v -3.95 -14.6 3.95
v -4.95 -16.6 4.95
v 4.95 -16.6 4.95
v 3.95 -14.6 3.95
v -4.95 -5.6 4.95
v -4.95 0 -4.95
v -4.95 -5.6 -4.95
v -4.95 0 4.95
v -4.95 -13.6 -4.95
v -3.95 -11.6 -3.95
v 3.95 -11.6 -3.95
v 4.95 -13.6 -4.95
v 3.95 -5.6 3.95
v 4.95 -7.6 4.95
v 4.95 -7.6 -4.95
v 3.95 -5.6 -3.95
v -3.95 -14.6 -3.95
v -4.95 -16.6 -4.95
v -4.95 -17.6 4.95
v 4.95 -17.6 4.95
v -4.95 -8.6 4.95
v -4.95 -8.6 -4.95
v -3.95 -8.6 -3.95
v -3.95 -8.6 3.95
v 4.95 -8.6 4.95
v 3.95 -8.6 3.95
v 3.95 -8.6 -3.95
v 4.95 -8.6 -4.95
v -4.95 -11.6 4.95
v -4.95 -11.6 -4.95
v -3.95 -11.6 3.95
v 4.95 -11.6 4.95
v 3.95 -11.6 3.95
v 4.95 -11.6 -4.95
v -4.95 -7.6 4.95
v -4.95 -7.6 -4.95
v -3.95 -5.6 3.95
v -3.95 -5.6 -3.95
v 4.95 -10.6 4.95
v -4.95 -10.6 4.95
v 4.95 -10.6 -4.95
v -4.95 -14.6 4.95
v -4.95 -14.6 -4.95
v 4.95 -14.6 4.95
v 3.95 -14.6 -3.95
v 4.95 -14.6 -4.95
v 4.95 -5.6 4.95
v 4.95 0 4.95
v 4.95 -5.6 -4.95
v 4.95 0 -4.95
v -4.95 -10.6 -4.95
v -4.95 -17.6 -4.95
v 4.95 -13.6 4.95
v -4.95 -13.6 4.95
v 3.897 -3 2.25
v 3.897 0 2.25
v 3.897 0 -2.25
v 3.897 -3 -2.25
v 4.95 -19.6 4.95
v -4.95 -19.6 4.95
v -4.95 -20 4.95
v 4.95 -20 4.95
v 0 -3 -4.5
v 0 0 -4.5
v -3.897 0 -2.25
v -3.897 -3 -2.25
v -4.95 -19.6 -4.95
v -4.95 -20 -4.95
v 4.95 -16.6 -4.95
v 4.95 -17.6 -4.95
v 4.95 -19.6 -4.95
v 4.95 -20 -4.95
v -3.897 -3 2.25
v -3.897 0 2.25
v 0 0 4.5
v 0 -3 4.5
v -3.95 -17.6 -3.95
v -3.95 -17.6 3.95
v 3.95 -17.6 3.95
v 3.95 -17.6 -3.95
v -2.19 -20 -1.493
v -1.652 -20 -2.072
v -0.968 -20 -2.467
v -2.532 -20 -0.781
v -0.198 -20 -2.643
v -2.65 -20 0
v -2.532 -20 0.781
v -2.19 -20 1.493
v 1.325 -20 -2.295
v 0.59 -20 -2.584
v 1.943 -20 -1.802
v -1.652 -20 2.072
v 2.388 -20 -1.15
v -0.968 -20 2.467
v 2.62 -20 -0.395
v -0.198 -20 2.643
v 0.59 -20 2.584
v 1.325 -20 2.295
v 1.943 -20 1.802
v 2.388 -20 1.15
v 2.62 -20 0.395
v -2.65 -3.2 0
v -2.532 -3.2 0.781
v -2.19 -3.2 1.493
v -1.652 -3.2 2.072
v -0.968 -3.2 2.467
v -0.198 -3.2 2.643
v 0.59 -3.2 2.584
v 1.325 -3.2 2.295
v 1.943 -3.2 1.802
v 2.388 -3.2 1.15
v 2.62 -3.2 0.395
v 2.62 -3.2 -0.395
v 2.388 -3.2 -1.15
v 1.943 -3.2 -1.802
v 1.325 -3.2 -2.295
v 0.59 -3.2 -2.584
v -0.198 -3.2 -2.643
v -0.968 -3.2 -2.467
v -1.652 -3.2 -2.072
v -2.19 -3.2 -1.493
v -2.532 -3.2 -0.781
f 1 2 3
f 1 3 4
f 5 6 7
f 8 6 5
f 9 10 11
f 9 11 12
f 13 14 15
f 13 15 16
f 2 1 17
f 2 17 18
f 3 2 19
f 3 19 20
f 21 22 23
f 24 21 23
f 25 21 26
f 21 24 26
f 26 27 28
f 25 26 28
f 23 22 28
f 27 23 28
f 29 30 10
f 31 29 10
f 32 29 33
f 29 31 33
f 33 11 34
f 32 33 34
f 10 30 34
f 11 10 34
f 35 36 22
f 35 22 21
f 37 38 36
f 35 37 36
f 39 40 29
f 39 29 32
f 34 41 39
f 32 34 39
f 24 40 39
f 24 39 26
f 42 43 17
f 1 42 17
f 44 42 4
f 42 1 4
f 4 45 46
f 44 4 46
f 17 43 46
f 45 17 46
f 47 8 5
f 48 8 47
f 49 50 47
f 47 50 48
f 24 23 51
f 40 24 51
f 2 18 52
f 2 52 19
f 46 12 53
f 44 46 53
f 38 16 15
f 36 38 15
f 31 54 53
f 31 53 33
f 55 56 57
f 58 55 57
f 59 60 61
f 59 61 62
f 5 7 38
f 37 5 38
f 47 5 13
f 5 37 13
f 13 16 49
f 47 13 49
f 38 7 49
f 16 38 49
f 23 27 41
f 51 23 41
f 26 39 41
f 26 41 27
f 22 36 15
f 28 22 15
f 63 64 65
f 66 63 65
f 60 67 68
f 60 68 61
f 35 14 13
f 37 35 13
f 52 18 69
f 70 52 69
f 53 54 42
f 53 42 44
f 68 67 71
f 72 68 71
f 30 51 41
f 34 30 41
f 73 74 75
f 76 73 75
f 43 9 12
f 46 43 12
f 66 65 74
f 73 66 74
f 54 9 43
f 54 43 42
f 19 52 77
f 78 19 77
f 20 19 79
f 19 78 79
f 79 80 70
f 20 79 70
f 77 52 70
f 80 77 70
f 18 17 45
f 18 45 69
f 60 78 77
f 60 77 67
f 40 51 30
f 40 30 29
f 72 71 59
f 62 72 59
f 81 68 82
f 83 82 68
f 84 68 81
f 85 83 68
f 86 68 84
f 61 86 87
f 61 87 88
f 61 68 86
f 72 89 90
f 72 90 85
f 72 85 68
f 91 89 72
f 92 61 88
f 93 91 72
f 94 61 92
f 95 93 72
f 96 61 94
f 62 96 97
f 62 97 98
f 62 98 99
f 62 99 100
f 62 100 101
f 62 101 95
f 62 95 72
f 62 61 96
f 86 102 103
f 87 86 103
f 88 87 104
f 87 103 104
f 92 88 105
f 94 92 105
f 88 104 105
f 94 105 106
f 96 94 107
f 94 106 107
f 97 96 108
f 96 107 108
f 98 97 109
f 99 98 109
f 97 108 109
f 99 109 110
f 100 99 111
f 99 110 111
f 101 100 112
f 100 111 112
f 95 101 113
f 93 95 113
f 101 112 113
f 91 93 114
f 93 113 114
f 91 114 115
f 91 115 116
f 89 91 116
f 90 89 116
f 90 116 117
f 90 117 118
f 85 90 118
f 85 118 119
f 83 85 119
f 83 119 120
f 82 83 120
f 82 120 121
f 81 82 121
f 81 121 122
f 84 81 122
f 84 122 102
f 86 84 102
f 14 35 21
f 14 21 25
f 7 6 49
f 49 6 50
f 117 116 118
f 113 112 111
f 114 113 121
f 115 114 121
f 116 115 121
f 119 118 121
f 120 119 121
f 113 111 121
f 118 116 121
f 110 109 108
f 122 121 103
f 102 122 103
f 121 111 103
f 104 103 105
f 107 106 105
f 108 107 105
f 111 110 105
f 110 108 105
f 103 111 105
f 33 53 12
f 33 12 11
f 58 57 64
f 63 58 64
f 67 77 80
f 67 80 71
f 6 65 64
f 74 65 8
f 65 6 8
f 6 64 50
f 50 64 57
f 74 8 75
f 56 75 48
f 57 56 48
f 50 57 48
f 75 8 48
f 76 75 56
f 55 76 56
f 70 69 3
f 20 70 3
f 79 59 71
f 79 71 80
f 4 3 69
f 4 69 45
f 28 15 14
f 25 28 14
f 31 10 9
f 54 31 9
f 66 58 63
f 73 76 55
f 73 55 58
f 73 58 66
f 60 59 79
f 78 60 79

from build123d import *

# Parameters (mm, degrees)
F0_W      = 9.9
F0_H      = 9.9
F1_DEPTH  = 20
F3_DEPTH  = 9.901
F5_DEPTH  = 9.901
F6_R      = 2.65
F7_DEPTH  = 20.001
F9_DEPTH  = 3
F10_START = -3
F10_DEPTH = 0.2


with BuildPart() as f1:
    # F0 (on Front) → F1 (new body)
    with BuildSketch(Plane.XZ):
        Rectangle(F0_W, F0_H)
    extrude(amount=F1_DEPTH)

    # F2 (on face) → F3 (cut, through all)
    with BuildSketch(Plane(origin=(0, 0, -4.95), x_dir=(1, 0, 0), z_dir=(0, 0, -1))):
        Polygon((-4.95, 7.6), (-4.95, 5.6), (-3.95, 5.6), align=None)
        Polygon((-4.95, 10.6), (-4.95, 8.6), (-3.95, 8.6), align=None)
        Polygon((-4.95, 13.6), (-4.95, 11.6), (-3.95, 11.6), align=None)
        Polygon((-4.95, 16.6), (-4.95, 14.6), (-3.95, 14.6), align=None)
        Polygon((-3.95, 17.6), (-4.95, 19.6), (-4.95, 17.6), align=None)
        Polygon((4.95, 5.6), (4.95, 7.6), (3.95, 5.6), align=None)
        Polygon((3.95, 8.6), (4.95, 8.6), (4.95, 10.6), align=None)
        Polygon((3.95, 11.6), (4.95, 11.6), (4.95, 13.6), align=None)
        Polygon((3.95, 14.6), (4.95, 14.6), (4.95, 16.6), align=None)
        Polygon((3.95, 17.6), (4.95, 17.6), (4.95, 19.6), align=None)
    extrude(amount=-F3_DEPTH, mode=Mode.SUBTRACT)

    # F4 (on face) → F5 (cut, through all)
    with BuildSketch(Plane.YZ.offset(4.95)):
        Polygon((10.1219329327, 0.5148088664), (10.1219329327, 2.5148088664), (9.1219329327, 0.5148088664), align=None)
        Polygon((-5.6, 3.95), (-5.6, 4.95), (-7.6, 4.95), align=None)
        Polygon((-8.6, 4.95), (-10.6, 4.95), (-8.6, 3.95), align=None)
        Polygon((-11.6, 4.95), (-13.6, 4.95), (-11.6, 3.95), align=None)
        Polygon((-14.6, 4.95), (-16.6, 4.95), (-14.6, 3.95), align=None)
        Polygon((-10.6, -4.95), (-8.6, -4.95), (-8.6, -3.95), align=None)
        Polygon((-16.6, -4.95), (-14.6, -4.95), (-14.6, -3.95), align=None)
        Polygon((-7.6, -4.95), (-5.6, -4.95), (-5.6, -3.95), align=None)
        Polygon((-13.6, -4.95), (-11.6, -4.95), (-11.6, -3.95), align=None)
        Polygon((-17.6, 4.95), (-19.6, 4.95), (-17.6, 3.95), align=None)
        Polygon((-17.6, -4.95), (-17.6, -3.95), (-19.6, -4.95), align=None)
    extrude(amount=-F5_DEPTH, mode=Mode.SUBTRACT)

    # F6 (on face) → F7 (cut, through all)
    with BuildSketch(Plane(origin=(0, 0, 0), x_dir=(-1, 0, 0), z_dir=(0, 1, 0))):
        Circle(F6_R)
    extrude(amount=-F7_DEPTH, mode=Mode.SUBTRACT)

    # F8 (on face) → F9 (cut)
    with BuildSketch(Plane(origin=(0, 0, 0), x_dir=(-1, 0, 0), z_dir=(0, 1, 0))):
        Polygon((0, -4.5), (3.897114317, -2.25), (3.897114317, 2.25), (0, 4.5), (-3.897114317, 2.25), (-3.897114317, -2.25), align=None)
    extrude(amount=-F9_DEPTH, mode=Mode.SUBTRACT)

    # F8 (on face) → F10 (join)
    with BuildSketch(Plane(origin=(0, 0, 0), x_dir=(-1, 0, 0), z_dir=(0, 1, 0)).offset(F10_START)):
        Polygon((0, -4.5), (3.897114317, -2.25), (3.897114317, 2.25), (0, 4.5), (-3.897114317, 2.25), (-3.897114317, -2.25), align=None)
    extrude(amount=-F10_DEPTH)


solid = f1.part
